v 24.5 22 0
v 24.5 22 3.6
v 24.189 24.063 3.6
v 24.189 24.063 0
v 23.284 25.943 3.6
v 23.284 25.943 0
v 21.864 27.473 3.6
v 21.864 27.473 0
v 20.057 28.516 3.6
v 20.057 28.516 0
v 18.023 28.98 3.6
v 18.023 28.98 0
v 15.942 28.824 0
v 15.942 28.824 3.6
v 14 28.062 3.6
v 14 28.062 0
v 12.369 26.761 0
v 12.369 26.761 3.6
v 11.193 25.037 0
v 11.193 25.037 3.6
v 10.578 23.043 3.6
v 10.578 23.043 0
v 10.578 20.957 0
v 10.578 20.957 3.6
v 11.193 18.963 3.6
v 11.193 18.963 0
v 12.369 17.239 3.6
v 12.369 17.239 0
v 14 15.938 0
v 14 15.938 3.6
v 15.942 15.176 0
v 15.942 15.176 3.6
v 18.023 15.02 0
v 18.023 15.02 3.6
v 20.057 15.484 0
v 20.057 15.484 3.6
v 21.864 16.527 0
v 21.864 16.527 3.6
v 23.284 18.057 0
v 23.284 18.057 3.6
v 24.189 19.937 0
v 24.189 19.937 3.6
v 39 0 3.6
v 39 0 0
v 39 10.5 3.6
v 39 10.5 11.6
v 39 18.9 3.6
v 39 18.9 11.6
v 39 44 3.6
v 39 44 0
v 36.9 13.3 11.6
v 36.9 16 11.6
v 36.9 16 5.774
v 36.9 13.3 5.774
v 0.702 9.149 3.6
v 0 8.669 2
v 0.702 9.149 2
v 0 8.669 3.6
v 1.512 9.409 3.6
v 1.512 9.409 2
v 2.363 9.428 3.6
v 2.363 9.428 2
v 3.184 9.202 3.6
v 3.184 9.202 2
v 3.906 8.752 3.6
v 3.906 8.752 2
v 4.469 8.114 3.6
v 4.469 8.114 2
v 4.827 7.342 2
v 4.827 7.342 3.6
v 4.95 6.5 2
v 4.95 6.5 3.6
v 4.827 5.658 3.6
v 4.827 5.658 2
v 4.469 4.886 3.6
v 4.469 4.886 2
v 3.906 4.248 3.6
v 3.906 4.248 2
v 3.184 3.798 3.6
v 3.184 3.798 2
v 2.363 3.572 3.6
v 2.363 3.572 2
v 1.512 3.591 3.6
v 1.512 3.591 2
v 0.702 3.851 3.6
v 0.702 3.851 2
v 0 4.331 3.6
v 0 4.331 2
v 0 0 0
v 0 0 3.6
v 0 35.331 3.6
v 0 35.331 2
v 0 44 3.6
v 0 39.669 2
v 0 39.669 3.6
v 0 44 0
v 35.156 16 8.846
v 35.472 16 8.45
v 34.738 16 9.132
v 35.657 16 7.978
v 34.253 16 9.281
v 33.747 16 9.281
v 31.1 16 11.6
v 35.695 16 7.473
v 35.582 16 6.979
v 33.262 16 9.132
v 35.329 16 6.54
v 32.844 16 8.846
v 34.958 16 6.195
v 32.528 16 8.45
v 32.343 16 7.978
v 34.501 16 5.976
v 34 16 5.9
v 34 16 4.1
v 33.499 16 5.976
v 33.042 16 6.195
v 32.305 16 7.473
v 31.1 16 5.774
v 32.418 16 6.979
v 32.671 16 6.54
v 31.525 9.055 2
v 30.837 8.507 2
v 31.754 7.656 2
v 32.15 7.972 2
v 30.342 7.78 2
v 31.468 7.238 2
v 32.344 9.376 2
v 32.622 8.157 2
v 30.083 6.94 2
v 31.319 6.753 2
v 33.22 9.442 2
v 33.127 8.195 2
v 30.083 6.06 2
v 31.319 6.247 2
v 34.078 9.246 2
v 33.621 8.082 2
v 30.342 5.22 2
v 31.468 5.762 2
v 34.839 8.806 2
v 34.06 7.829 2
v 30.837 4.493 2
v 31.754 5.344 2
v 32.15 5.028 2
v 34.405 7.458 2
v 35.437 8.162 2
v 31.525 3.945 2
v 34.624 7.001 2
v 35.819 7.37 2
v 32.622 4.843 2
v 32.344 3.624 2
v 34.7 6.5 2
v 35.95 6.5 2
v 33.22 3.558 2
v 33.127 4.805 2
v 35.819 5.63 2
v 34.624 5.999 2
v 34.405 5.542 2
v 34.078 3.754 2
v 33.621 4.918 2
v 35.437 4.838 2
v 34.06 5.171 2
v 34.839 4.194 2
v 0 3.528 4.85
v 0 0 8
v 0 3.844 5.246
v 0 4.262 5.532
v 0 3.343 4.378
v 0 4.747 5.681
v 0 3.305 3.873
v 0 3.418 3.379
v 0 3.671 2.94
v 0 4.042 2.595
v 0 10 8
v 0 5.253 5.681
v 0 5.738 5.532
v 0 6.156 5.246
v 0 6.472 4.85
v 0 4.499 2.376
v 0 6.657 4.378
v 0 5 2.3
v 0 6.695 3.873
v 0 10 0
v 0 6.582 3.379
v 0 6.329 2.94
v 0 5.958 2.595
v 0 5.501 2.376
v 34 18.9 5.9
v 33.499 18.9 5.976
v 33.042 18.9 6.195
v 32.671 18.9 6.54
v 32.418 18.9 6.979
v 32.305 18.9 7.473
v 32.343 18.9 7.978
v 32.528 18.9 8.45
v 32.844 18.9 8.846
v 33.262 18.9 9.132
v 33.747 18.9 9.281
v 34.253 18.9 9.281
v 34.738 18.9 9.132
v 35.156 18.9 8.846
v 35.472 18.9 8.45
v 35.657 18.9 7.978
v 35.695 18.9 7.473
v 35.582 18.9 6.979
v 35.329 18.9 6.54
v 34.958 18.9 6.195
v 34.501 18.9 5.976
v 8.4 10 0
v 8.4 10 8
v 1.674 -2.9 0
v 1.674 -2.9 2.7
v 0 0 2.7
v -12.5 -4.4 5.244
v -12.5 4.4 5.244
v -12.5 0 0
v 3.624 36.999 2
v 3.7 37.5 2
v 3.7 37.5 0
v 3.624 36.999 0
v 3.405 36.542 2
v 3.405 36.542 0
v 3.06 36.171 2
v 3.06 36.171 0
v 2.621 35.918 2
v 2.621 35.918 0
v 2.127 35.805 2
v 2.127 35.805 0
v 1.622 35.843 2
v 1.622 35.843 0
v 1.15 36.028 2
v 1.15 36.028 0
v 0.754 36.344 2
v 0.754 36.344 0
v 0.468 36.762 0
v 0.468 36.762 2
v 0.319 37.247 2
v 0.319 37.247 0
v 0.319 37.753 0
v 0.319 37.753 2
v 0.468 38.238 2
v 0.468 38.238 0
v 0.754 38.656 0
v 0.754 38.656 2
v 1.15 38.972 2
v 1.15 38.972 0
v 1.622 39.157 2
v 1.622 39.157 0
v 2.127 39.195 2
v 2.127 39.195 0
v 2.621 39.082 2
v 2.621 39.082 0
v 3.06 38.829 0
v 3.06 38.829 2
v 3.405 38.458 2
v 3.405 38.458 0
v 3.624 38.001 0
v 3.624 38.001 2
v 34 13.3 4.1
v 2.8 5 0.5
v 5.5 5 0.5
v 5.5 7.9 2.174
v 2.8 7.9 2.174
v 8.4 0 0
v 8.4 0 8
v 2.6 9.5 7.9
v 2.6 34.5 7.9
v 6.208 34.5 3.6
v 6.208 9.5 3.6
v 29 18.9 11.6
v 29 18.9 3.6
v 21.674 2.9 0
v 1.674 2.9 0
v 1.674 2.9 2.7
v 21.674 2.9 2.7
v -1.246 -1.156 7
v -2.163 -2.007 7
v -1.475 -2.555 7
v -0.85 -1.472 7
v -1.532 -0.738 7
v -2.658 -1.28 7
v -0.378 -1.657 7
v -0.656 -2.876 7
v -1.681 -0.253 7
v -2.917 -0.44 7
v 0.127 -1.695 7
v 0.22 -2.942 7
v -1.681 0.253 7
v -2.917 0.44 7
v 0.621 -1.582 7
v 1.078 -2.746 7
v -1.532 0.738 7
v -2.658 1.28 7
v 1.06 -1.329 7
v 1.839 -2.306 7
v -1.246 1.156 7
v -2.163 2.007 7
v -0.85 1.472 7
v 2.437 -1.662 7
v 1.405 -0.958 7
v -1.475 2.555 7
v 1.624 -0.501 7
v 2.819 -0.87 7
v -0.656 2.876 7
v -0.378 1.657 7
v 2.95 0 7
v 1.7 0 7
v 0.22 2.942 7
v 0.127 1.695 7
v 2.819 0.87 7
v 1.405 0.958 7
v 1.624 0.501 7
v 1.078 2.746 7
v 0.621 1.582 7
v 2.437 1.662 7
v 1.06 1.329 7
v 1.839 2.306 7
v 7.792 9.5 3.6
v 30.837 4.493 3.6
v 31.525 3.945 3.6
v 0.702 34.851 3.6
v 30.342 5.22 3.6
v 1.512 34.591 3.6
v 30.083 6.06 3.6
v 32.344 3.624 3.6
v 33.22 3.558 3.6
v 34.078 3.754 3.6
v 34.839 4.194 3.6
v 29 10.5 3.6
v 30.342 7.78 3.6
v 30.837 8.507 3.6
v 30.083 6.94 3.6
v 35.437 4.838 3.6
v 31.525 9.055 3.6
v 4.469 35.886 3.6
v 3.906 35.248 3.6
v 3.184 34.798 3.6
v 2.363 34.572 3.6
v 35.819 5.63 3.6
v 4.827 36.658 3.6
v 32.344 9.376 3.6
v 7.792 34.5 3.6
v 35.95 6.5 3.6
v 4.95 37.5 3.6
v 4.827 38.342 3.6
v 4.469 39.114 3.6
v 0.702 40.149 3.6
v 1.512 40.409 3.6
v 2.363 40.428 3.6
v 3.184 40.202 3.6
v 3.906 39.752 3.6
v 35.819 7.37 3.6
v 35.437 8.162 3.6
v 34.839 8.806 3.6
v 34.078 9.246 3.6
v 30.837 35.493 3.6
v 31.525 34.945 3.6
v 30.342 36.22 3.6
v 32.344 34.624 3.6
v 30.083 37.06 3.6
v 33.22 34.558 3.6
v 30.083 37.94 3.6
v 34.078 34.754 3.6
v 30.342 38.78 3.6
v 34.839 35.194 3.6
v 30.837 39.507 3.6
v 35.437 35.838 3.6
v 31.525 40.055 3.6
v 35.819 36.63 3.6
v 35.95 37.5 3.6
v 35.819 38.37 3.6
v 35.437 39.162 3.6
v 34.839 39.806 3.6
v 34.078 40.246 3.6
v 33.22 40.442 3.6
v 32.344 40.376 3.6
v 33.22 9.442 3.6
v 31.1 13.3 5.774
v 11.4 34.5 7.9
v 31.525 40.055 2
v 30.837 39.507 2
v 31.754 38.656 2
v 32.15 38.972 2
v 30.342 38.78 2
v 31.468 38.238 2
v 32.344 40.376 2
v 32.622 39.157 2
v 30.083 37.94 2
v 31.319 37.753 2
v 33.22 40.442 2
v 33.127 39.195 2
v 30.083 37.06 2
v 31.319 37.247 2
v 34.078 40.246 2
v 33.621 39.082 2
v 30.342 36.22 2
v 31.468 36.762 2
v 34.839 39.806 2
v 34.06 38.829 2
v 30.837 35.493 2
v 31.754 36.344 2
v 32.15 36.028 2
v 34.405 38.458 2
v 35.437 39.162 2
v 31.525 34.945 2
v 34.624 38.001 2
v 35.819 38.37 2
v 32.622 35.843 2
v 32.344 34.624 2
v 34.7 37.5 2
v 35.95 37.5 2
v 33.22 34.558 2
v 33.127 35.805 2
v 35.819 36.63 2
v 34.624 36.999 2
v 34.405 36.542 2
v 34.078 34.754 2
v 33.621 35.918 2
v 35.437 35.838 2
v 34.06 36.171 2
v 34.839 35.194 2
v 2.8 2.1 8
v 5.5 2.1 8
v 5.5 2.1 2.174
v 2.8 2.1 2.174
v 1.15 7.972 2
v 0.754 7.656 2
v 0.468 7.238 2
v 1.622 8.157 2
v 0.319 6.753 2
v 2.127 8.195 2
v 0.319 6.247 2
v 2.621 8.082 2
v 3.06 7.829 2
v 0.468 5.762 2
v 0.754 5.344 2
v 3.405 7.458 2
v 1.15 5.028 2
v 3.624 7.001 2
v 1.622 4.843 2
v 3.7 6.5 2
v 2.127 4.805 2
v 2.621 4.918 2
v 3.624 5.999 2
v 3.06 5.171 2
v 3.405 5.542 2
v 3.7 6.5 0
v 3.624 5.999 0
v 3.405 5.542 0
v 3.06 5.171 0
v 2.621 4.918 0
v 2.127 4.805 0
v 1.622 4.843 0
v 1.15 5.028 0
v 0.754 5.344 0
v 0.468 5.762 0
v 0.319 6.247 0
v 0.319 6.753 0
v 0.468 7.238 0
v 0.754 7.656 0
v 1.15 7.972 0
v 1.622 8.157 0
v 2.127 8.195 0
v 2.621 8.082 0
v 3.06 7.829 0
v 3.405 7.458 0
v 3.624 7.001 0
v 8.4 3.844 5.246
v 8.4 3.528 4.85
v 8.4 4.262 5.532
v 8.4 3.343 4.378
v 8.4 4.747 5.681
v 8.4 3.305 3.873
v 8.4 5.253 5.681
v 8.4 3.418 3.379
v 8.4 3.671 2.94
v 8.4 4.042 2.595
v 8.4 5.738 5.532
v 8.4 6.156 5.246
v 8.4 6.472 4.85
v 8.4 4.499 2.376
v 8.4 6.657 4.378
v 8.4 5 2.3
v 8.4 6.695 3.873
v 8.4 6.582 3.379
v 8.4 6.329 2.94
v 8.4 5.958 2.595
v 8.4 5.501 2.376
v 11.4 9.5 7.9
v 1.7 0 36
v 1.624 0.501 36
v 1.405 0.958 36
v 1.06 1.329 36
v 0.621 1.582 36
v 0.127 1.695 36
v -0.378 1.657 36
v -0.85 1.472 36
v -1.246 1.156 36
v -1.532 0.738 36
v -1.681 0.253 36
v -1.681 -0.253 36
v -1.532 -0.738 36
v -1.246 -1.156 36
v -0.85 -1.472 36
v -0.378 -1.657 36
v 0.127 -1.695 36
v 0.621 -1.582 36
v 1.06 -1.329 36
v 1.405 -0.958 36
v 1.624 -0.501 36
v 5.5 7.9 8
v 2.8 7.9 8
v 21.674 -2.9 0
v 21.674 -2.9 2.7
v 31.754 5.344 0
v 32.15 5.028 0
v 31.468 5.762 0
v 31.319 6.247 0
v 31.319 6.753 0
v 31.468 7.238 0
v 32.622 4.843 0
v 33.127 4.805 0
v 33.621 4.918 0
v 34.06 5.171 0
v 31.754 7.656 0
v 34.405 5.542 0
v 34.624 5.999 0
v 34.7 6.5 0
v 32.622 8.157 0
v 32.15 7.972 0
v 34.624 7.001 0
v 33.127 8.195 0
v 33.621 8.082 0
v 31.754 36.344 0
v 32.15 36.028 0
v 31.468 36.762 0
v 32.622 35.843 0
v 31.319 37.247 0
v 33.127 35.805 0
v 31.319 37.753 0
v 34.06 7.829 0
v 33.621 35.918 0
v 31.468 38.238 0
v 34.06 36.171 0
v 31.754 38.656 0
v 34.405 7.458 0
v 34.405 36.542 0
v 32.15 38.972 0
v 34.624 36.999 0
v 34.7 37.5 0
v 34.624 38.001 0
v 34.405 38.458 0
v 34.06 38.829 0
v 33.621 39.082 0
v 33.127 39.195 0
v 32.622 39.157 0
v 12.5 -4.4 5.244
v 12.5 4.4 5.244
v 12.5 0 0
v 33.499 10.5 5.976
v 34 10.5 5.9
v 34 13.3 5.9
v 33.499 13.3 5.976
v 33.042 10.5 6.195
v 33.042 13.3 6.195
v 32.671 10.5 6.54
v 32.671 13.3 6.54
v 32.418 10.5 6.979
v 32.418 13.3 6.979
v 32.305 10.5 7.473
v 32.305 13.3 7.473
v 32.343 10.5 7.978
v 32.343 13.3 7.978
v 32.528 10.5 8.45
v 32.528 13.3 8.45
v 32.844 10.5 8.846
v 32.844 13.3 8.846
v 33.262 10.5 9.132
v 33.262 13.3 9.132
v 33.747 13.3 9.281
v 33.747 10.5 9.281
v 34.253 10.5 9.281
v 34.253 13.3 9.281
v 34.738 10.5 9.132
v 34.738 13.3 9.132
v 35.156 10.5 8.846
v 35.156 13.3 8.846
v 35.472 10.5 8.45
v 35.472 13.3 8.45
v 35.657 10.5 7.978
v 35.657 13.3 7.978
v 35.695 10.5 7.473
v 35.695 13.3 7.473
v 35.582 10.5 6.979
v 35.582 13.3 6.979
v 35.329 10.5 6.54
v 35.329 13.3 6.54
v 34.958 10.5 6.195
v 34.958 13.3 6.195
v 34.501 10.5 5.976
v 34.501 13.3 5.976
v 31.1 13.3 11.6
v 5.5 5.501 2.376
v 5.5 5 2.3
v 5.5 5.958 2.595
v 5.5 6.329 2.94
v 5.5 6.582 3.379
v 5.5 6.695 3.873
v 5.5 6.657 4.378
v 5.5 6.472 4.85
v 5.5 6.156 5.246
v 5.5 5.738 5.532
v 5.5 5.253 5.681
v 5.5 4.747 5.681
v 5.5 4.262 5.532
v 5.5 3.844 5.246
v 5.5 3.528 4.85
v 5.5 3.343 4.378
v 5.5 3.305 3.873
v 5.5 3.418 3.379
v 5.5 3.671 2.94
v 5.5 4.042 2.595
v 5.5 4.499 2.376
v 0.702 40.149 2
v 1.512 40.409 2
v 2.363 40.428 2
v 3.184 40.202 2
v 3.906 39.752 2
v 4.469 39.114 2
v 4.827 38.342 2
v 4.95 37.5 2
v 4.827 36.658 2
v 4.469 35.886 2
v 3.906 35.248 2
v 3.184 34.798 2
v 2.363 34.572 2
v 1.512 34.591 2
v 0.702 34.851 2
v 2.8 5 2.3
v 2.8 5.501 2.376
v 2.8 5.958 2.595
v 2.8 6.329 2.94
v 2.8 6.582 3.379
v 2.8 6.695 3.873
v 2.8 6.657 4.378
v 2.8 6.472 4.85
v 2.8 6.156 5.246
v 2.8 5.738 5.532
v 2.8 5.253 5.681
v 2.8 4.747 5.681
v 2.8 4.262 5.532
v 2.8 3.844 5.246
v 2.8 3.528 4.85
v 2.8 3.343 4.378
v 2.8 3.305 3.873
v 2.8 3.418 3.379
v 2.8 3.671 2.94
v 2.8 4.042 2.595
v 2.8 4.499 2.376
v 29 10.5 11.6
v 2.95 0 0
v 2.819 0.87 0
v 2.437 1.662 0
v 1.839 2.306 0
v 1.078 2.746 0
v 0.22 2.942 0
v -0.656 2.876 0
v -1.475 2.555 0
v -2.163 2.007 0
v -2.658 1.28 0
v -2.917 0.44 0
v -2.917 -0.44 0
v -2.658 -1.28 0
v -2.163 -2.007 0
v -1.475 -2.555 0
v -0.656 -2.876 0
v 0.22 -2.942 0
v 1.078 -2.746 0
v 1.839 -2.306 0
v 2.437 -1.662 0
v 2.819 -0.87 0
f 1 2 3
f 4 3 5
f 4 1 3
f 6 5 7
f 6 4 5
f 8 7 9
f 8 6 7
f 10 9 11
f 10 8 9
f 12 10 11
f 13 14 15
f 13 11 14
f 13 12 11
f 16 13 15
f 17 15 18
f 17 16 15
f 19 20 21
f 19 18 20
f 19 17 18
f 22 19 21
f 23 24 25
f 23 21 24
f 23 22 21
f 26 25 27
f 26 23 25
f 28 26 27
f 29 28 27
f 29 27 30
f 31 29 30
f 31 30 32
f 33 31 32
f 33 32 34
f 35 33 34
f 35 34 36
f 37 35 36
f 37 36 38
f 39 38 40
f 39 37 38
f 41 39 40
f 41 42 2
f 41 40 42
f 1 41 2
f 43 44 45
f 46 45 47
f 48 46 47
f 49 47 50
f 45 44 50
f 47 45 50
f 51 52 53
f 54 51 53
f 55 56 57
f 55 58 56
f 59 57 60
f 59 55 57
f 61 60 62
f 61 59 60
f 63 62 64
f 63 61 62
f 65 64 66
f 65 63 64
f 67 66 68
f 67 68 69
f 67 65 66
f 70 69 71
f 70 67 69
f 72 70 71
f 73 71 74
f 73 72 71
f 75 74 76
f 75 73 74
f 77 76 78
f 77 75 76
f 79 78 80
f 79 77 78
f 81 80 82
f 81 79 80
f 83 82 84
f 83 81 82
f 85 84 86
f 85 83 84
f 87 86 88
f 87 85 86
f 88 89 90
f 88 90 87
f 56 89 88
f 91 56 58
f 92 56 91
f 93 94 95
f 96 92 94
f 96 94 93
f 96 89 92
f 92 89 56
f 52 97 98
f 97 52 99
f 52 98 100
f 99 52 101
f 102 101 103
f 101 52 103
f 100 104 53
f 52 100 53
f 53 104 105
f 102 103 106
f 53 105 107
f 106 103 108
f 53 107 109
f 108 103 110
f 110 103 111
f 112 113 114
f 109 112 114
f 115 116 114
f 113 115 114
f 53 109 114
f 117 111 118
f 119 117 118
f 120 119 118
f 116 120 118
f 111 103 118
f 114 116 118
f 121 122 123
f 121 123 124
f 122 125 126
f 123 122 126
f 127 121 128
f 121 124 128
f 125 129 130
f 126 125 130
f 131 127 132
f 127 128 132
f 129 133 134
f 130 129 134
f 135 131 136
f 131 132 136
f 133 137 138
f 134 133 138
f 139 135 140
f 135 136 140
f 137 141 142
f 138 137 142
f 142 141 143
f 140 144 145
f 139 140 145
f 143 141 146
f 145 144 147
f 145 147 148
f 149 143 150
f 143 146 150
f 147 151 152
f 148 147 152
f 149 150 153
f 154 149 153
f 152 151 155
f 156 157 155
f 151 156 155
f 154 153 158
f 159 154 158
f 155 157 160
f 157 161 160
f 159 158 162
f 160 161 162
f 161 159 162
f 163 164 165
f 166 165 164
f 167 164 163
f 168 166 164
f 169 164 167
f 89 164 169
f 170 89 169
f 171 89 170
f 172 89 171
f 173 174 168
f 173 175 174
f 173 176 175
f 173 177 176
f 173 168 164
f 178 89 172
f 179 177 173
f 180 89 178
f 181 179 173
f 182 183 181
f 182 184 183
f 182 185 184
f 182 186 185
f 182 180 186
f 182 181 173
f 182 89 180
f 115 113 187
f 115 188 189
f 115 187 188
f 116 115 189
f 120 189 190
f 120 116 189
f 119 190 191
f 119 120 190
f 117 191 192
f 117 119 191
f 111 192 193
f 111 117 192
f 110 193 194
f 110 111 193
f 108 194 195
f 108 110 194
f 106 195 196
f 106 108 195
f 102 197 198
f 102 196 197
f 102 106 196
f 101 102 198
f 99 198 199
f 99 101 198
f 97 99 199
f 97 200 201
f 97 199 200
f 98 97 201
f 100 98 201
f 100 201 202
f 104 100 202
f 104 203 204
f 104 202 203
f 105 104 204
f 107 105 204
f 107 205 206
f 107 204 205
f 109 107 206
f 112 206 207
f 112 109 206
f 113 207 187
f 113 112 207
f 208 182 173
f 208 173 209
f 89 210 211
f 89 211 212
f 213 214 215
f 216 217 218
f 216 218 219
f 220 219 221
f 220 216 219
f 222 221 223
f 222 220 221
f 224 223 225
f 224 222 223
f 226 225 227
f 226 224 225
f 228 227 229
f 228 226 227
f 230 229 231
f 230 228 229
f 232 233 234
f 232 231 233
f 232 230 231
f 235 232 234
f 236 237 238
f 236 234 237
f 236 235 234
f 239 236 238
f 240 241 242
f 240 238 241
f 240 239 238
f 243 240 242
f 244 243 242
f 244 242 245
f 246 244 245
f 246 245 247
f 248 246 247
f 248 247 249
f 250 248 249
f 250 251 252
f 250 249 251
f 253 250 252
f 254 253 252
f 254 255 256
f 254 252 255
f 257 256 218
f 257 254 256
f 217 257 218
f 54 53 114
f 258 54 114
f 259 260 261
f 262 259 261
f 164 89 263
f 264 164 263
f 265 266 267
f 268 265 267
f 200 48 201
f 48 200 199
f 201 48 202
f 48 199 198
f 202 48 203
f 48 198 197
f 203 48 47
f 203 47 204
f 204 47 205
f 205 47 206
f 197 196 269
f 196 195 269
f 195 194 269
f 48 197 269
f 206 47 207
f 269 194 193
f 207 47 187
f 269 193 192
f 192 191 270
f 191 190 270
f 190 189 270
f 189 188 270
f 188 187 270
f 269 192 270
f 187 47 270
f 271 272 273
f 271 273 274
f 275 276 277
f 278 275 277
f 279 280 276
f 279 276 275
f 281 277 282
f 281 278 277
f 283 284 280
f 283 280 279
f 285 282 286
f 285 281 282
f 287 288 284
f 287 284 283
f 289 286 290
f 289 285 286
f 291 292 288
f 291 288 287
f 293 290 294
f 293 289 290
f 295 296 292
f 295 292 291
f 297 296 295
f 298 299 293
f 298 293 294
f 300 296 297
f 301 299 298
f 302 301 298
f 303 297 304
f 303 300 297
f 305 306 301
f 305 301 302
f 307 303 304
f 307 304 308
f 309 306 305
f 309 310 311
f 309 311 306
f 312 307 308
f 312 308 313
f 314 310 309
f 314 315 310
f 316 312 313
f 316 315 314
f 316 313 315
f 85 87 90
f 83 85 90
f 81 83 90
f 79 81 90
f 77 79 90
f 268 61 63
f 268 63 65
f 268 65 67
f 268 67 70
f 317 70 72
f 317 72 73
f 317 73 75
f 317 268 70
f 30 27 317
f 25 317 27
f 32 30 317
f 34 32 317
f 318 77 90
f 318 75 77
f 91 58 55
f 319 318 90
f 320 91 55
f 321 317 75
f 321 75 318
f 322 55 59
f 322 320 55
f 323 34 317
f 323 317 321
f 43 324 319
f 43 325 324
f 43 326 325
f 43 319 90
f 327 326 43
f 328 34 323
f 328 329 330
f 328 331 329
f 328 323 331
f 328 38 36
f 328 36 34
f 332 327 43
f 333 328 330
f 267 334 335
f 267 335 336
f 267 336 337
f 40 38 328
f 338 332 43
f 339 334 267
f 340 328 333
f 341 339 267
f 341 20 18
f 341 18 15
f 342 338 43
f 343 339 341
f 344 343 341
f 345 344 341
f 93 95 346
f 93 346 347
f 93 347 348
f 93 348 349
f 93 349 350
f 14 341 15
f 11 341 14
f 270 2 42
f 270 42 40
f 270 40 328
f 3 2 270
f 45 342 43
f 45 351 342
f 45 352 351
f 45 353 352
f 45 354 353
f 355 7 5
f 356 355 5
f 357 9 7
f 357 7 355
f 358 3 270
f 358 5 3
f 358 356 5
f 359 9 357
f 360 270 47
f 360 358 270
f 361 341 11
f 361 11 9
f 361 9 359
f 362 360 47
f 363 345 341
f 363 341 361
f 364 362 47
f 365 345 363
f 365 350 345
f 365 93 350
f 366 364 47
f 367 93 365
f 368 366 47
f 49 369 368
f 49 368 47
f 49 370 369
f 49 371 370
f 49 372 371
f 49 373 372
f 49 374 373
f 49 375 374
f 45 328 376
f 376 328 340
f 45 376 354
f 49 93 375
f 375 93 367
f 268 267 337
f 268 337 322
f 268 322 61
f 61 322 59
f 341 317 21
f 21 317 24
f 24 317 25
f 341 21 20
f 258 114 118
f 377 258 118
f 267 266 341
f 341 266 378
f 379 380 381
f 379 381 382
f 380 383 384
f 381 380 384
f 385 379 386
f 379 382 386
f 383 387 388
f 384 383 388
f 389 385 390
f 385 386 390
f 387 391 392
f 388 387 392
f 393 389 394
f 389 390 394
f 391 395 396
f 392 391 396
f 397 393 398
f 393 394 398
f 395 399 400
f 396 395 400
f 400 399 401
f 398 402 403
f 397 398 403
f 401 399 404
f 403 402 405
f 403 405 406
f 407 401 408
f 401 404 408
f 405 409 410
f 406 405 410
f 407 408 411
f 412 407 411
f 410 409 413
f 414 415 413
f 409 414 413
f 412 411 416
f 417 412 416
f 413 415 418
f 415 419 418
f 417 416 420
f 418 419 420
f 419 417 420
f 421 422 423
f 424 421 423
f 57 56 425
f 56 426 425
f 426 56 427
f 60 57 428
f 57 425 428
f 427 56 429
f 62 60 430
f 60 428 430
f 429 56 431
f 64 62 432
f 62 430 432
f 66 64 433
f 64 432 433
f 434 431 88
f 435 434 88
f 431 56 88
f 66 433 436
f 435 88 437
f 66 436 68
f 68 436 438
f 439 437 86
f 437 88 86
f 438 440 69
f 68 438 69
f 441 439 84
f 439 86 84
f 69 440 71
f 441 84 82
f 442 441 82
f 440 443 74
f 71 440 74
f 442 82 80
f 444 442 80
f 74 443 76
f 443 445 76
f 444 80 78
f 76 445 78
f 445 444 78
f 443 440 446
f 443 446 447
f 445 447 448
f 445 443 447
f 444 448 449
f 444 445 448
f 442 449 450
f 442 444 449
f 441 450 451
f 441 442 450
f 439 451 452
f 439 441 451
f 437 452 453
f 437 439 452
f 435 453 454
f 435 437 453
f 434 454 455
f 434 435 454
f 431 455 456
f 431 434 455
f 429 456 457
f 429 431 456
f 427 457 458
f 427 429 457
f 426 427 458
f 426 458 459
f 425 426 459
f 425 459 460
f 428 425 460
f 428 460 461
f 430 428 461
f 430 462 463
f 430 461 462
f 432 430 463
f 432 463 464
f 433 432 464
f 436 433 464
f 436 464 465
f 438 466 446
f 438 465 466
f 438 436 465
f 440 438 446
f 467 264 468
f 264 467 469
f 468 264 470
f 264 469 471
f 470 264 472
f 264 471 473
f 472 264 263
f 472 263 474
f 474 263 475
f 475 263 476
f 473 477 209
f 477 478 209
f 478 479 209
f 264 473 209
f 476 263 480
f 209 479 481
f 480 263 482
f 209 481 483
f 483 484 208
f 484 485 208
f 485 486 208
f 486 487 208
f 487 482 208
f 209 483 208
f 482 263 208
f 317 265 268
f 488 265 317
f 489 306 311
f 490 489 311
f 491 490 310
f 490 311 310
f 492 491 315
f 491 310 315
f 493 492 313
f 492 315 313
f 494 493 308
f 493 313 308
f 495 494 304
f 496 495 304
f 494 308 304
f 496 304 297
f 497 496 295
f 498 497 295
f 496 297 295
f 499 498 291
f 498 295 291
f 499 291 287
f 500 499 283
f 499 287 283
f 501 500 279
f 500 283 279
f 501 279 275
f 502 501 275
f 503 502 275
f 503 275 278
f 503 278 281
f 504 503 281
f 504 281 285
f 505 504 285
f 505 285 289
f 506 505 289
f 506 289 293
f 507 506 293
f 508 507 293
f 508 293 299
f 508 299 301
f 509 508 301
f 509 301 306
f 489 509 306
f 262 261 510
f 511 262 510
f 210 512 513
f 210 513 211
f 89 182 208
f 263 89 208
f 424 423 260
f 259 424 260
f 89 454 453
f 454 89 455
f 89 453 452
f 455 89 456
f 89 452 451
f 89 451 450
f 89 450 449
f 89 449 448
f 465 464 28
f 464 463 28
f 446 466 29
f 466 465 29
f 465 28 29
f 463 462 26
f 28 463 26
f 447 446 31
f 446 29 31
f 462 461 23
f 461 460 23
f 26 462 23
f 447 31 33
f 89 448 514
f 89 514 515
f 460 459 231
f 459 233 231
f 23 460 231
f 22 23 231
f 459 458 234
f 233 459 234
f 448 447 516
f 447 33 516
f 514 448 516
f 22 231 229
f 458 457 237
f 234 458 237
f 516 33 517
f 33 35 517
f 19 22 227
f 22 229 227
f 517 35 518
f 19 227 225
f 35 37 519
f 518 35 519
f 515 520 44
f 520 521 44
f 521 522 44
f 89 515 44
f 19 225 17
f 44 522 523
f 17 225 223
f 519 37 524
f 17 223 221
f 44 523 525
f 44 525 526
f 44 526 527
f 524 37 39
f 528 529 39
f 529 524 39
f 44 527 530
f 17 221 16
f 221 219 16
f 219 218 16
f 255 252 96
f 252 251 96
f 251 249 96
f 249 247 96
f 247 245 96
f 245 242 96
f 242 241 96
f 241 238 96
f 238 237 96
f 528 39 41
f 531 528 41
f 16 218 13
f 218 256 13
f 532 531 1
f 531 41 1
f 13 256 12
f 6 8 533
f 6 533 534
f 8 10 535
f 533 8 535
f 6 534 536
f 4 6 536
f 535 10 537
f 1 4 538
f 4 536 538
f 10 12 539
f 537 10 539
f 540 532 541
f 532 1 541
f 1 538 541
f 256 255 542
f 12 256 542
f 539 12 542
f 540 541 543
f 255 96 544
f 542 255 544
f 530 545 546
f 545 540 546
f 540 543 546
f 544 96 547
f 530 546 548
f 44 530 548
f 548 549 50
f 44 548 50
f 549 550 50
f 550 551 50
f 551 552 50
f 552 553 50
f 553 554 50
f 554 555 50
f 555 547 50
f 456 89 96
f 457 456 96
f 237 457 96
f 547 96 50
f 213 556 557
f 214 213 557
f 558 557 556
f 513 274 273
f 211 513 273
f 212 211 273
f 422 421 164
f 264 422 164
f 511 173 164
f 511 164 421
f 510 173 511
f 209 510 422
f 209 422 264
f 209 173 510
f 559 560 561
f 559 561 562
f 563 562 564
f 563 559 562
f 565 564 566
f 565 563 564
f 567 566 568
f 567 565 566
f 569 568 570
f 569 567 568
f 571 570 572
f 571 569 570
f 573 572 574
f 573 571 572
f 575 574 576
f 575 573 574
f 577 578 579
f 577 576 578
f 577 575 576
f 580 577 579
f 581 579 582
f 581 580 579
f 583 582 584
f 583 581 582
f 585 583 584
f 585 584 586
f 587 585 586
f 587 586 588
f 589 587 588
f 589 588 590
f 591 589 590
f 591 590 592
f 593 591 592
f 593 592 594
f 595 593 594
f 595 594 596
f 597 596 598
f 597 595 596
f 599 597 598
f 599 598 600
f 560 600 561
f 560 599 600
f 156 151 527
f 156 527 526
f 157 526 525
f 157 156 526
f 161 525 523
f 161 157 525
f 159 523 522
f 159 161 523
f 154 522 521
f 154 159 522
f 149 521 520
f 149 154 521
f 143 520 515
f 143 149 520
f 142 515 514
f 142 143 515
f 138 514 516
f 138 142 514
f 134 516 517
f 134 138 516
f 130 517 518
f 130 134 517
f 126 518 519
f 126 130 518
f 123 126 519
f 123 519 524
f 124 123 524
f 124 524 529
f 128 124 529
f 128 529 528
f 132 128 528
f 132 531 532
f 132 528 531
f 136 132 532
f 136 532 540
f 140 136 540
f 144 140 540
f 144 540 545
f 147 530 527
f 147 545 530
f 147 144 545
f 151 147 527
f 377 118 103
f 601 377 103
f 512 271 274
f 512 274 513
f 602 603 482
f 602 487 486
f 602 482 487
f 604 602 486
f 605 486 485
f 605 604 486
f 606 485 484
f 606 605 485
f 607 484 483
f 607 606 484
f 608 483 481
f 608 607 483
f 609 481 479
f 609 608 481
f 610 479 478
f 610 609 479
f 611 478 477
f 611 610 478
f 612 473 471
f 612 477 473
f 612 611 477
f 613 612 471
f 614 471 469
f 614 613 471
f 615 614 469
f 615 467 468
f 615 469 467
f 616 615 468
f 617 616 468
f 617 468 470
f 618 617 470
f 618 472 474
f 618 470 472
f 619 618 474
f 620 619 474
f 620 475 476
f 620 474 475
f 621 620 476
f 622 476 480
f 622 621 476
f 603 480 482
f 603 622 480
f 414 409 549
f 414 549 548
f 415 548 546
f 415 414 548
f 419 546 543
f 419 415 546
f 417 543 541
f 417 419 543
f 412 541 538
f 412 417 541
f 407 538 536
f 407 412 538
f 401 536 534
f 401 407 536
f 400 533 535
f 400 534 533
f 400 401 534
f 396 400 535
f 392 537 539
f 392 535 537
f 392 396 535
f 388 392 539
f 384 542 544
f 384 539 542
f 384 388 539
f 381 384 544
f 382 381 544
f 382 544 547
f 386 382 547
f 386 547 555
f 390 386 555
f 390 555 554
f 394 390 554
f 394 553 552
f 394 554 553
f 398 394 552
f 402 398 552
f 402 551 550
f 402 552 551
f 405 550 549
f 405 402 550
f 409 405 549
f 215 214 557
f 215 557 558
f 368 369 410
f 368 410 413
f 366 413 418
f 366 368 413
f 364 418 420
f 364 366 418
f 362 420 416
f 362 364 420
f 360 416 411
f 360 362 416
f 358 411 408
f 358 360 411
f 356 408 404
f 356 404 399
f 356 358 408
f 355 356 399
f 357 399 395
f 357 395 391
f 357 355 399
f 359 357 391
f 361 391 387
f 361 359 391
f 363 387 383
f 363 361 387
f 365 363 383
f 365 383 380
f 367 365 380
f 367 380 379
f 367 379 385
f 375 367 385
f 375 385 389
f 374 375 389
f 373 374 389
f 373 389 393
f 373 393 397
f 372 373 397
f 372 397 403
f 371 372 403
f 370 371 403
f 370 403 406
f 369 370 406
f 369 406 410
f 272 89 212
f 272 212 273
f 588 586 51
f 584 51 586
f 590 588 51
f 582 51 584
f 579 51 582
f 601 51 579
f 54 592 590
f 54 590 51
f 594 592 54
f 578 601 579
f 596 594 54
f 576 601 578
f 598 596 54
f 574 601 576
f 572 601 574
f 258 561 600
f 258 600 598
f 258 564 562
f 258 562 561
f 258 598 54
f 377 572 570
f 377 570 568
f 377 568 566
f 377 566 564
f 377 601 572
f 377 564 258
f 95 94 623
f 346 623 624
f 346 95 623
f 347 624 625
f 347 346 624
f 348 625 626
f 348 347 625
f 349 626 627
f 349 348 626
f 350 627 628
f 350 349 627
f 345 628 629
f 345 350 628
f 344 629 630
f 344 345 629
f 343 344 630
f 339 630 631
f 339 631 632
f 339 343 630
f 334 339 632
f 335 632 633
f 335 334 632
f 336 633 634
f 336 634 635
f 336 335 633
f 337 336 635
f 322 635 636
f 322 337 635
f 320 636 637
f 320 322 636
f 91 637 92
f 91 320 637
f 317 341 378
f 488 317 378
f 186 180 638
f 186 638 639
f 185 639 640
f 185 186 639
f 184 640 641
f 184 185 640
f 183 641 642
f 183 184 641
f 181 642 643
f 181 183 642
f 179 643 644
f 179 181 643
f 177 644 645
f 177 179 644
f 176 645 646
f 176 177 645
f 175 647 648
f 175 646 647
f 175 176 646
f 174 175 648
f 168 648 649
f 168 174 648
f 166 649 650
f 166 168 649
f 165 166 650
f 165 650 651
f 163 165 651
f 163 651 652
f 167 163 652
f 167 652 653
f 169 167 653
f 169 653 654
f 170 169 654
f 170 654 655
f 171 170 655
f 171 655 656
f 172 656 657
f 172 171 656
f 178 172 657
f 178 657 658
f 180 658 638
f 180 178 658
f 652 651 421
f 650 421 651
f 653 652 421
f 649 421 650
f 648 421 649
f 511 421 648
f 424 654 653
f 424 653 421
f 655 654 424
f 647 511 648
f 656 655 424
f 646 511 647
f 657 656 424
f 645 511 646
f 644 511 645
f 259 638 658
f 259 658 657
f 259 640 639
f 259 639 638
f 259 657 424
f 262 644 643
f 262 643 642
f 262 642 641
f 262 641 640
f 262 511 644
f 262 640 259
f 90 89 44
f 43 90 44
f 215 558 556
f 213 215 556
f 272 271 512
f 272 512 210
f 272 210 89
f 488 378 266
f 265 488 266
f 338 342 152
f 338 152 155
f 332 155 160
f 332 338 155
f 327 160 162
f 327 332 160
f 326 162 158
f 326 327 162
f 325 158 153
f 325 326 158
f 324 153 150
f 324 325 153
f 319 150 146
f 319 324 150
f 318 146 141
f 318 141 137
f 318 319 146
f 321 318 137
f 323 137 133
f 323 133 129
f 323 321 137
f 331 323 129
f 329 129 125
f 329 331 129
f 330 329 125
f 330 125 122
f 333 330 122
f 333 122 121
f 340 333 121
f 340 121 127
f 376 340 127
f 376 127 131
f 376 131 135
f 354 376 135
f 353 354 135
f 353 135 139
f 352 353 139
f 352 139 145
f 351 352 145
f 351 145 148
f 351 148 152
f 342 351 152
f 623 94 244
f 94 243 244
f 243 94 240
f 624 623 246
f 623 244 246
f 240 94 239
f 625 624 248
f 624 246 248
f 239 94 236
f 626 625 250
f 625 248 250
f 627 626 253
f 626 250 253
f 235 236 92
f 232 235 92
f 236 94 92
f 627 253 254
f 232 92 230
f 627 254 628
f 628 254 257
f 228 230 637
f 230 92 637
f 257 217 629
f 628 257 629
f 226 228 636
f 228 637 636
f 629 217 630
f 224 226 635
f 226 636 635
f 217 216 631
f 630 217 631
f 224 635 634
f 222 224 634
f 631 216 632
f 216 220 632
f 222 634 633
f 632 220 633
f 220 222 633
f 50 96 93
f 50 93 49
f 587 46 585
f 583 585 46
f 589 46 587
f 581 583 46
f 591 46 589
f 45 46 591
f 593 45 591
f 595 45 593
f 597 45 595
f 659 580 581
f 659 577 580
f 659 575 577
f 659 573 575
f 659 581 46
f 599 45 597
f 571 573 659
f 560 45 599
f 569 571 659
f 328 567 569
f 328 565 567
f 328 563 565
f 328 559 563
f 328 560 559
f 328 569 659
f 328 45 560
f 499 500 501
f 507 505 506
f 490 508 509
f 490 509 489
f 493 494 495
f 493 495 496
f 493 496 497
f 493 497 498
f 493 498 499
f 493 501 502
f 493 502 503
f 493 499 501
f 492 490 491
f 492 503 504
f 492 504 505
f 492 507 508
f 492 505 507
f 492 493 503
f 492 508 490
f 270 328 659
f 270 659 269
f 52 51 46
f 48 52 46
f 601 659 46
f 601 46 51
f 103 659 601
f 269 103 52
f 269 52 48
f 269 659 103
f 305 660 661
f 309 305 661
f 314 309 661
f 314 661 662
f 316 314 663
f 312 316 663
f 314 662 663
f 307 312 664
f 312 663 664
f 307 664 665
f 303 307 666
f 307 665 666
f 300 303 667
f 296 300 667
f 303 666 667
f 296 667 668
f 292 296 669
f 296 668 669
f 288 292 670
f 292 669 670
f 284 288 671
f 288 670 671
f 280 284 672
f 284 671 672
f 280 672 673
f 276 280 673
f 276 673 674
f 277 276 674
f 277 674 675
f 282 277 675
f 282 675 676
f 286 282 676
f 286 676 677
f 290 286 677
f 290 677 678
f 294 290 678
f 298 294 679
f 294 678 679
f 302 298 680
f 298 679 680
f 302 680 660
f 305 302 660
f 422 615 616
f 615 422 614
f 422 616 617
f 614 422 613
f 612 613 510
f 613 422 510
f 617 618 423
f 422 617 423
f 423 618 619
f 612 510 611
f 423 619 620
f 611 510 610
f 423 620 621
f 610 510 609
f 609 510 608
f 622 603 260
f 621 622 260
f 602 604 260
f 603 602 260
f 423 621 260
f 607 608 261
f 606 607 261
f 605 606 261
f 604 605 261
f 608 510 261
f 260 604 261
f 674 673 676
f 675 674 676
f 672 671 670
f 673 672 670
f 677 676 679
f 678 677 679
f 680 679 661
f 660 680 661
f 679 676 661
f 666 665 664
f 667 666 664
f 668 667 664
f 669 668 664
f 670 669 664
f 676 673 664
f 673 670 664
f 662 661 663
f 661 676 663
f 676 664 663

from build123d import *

# Parameters (mm, degrees)
CYLINDER_R               = 2.95
CYLINDER_DEPTH           = 7
CYLINDER001_R            = 1.7
CYLINDER001_DEPTH        = 30
PAD002_DEPTH             = 2.7
PAD039_DEPTH             = 12.5
CLONE292_PITCH_ANGLE     = -90
CLONE291_PITCH_ANGLE     = 90
BOX255_W                 = 8.4
BOX255_H                 = 10
BOX255_DEPTH             = 8
CLONE299_PLACEMENT_ANGLE = 90
CLONE298_PLACEMENT_ANGLE = 90
CLONE295_PLACEMENT_ANGLE = 180
CLONE294_PLACEMENT_ANGLE = 180
CLONE297_PLACEMENT_ANGLE = 180
CYLINDER1028_R           = 7
CYLINDER1028_DEPTH       = 10
CLONE296_PLACEMENT_ANGLE = 180
BOX256_W                 = 39
BOX256_H                 = 44
BOX256_DEPTH             = 3.6


with BuildPart() as m3bolthead:
    # Cylinder → Cylinder (new body)
    with BuildSketch(Plane.XY):
        Circle(CYLINDER_R)
    extrude(amount=CYLINDER_DEPTH)


with BuildPart() as m3bolt:
    # Cylinder001 → Cylinder001 (new body)
    with BuildSketch(Plane.XY.offset(6)):
        Circle(CYLINDER001_R)
    extrude(amount=CYLINDER001_DEPTH)

    # Fusion: union M3BoltHead
    add(m3bolthead.part)


with BuildPart() as m3nuthousing:
    # Sketch003 → Pad002 (new body)
    with BuildSketch(Plane.XY):
        Polygon((0, 0), (1.674316, 2.9), (21.674316, 2.9), (21.674316, -2.9), (1.674316, -2.9), align=None)
    extrude(amount=PAD002_DEPTH)


with BuildPart() as art56milanoguidemaster:
    # Sketch056 → Pad039 (new body, symmetric)
    with BuildSketch(Plane.YZ):
        Polygon((-4.4, 5.243716), (4.4, 5.243716), (0, 0), align=None)
    extrude(amount=PAD039_DEPTH, both=True)


with BuildPart() as clone_of_m3nuthousing026:
    # Clone292 base: copy of M3NutHousing
    add(m3nuthousing.part)


with BuildPart() as clone_of_m3nuthousing026_1:
    # Clone292 pitch: moved
    add(clone_of_m3nuthousing026.part.rotate(Axis((0, 0, 0), (0, 1, 0)), CLONE292_PITCH_ANGLE))


with BuildPart() as clone_of_m3nuthousing026_2:
    # Clone292 placement: moved
    add(clone_of_m3nuthousing026_1.part.moved(Location((5.5, 5, 0.5))))


with BuildPart() as fusion101:
    # Clone291 base: copy of M3Bolt
    add(m3bolt.part)


with BuildPart() as fusion101_1:
    # Clone291 pitch: moved
    add(fusion101.part.rotate(Axis((0, 0, 0), (0, 1, 0)), CLONE291_PITCH_ANGLE))


with BuildPart() as fusion101_2:
    # Clone291 placement: moved
    add(fusion101_1.part.moved(Location((-14.5, 5, 4))))

    # Fusion101: union Clone of M3NutHousing026
    add(clone_of_m3nuthousing026_2.part)


with BuildPart() as art56nutholdermaster:
    # Box255 → Box255 (new body)
    with BuildSketch(Plane.XY):
        with Locations((4.2, 5)):
            Rectangle(BOX255_W, BOX255_H)
    extrude(amount=BOX255_DEPTH)

    # Cut087: cut Fusion101
    add(fusion101_2.part, mode=Mode.SUBTRACT)


with BuildPart() as clone_of_art56nutholdermaster001:
    # Clone299 base: copy of Art56NutHolderMaster
    add(art56nutholdermaster.part)


with BuildPart() as clone_of_art56nutholdermaster001_1:
    # Clone299 placement: moved
    add(clone_of_art56nutholdermaster001.part.moved(Location((39, 10.5, 3.6))).rotate(Axis((39, 10.5, 3.6), (0, 0, 1)), CLONE299_PLACEMENT_ANGLE))


with BuildPart() as clone_of_art56milanoguidemaster001:
    # Clone298 base: copy of Art56MilanoGuideMaster
    add(art56milanoguidemaster.part)


with BuildPart() as clone_of_art56milanoguidemaster001_1:
    # Clone298 placement: moved
    add(clone_of_art56milanoguidemaster001.part.moved(Location((7, 22, 2.656284))).rotate(Axis((7, 22, 2.656284), (0, 0, 1)), CLONE298_PLACEMENT_ANGLE))


with BuildPart() as clone_of_m3bolt105:
    # Clone295 base: copy of M3Bolt
    add(m3bolt.part)


with BuildPart() as clone_of_m3bolt105_1:
    # Clone295 placement: moved
    add(clone_of_m3bolt105.part.moved(Location((2, 6.5, 9))).rotate(Axis((2, 6.5, 9), (1, 0, 0)), CLONE295_PLACEMENT_ANGLE))


with BuildPart() as clone_of_m3bolt104:
    # Clone294 base: copy of M3Bolt
    add(m3bolt.part)


with BuildPart() as clone_of_m3bolt104_1:
    # Clone294 placement: moved
    add(clone_of_m3bolt104.part.moved(Location((2, 37.5, 9))).rotate(Axis((2, 37.5, 9), (1, 0, 0)), CLONE294_PLACEMENT_ANGLE))


with BuildPart() as clone_of_m3bolt107:
    # Clone297 base: copy of M3Bolt
    add(m3bolt.part)


with BuildPart() as clone_of_m3bolt107_1:
    # Clone297 placement: moved
    add(clone_of_m3bolt107.part.moved(Location((33, 37.5, 9))).rotate(Axis((33, 37.5, 9), (1, 0, 0)), CLONE297_PLACEMENT_ANGLE))


with BuildPart() as cylinder1072:
    # Cylinder1028 → Cylinder1028 (new body)
    with BuildSketch(Plane(origin=(17.5, 22, 0), x_dir=(1, 0, 0), z_dir=(0, 0, 1))):
        Circle(CYLINDER1028_R)
    extrude(amount=CYLINDER1028_DEPTH)


with BuildPart() as fusion103:
    # Clone296 base: copy of M3Bolt
    add(m3bolt.part)


with BuildPart() as fusion103_1:
    # Clone296 placement: moved
    add(fusion103.part.moved(Location((33, 6.5, 9))).rotate(Axis((33, 6.5, 9), (1, 0, 0)), CLONE296_PLACEMENT_ANGLE))

    # Fusion103: union Clone of M3Bolt105, Clone of M3Bolt104, Clone of M3Bolt107, Cylinder1072
    add(clone_of_m3bolt105_1.part)
    add(clone_of_m3bolt104_1.part)
    add(clone_of_m3bolt107_1.part)
    add(cylinder1072.part)


with BuildPart() as art56motorholderb:
    # Box256 → Box256 (new body)
    with BuildSketch(Plane.XY):
        with Locations((19.5, 22)):
            Rectangle(BOX256_W, BOX256_H)
    extrude(amount=BOX256_DEPTH)

    # Cut088: cut Fusion103
    add(fusion103_1.part, mode=Mode.SUBTRACT)

    # Fusion120: union Clone of Art56NutHolderMaster001, Clone of Art56MilanoGuideMaster001
    add(clone_of_art56nutholdermaster001_1.part)
    add(clone_of_art56milanoguidemaster001_1.part)


solid = Compound([m3bolt.part, m3nuthousing.part, art56milanoguidemaster.part, art56nutholdermaster.part, art56motorholderb.part])
